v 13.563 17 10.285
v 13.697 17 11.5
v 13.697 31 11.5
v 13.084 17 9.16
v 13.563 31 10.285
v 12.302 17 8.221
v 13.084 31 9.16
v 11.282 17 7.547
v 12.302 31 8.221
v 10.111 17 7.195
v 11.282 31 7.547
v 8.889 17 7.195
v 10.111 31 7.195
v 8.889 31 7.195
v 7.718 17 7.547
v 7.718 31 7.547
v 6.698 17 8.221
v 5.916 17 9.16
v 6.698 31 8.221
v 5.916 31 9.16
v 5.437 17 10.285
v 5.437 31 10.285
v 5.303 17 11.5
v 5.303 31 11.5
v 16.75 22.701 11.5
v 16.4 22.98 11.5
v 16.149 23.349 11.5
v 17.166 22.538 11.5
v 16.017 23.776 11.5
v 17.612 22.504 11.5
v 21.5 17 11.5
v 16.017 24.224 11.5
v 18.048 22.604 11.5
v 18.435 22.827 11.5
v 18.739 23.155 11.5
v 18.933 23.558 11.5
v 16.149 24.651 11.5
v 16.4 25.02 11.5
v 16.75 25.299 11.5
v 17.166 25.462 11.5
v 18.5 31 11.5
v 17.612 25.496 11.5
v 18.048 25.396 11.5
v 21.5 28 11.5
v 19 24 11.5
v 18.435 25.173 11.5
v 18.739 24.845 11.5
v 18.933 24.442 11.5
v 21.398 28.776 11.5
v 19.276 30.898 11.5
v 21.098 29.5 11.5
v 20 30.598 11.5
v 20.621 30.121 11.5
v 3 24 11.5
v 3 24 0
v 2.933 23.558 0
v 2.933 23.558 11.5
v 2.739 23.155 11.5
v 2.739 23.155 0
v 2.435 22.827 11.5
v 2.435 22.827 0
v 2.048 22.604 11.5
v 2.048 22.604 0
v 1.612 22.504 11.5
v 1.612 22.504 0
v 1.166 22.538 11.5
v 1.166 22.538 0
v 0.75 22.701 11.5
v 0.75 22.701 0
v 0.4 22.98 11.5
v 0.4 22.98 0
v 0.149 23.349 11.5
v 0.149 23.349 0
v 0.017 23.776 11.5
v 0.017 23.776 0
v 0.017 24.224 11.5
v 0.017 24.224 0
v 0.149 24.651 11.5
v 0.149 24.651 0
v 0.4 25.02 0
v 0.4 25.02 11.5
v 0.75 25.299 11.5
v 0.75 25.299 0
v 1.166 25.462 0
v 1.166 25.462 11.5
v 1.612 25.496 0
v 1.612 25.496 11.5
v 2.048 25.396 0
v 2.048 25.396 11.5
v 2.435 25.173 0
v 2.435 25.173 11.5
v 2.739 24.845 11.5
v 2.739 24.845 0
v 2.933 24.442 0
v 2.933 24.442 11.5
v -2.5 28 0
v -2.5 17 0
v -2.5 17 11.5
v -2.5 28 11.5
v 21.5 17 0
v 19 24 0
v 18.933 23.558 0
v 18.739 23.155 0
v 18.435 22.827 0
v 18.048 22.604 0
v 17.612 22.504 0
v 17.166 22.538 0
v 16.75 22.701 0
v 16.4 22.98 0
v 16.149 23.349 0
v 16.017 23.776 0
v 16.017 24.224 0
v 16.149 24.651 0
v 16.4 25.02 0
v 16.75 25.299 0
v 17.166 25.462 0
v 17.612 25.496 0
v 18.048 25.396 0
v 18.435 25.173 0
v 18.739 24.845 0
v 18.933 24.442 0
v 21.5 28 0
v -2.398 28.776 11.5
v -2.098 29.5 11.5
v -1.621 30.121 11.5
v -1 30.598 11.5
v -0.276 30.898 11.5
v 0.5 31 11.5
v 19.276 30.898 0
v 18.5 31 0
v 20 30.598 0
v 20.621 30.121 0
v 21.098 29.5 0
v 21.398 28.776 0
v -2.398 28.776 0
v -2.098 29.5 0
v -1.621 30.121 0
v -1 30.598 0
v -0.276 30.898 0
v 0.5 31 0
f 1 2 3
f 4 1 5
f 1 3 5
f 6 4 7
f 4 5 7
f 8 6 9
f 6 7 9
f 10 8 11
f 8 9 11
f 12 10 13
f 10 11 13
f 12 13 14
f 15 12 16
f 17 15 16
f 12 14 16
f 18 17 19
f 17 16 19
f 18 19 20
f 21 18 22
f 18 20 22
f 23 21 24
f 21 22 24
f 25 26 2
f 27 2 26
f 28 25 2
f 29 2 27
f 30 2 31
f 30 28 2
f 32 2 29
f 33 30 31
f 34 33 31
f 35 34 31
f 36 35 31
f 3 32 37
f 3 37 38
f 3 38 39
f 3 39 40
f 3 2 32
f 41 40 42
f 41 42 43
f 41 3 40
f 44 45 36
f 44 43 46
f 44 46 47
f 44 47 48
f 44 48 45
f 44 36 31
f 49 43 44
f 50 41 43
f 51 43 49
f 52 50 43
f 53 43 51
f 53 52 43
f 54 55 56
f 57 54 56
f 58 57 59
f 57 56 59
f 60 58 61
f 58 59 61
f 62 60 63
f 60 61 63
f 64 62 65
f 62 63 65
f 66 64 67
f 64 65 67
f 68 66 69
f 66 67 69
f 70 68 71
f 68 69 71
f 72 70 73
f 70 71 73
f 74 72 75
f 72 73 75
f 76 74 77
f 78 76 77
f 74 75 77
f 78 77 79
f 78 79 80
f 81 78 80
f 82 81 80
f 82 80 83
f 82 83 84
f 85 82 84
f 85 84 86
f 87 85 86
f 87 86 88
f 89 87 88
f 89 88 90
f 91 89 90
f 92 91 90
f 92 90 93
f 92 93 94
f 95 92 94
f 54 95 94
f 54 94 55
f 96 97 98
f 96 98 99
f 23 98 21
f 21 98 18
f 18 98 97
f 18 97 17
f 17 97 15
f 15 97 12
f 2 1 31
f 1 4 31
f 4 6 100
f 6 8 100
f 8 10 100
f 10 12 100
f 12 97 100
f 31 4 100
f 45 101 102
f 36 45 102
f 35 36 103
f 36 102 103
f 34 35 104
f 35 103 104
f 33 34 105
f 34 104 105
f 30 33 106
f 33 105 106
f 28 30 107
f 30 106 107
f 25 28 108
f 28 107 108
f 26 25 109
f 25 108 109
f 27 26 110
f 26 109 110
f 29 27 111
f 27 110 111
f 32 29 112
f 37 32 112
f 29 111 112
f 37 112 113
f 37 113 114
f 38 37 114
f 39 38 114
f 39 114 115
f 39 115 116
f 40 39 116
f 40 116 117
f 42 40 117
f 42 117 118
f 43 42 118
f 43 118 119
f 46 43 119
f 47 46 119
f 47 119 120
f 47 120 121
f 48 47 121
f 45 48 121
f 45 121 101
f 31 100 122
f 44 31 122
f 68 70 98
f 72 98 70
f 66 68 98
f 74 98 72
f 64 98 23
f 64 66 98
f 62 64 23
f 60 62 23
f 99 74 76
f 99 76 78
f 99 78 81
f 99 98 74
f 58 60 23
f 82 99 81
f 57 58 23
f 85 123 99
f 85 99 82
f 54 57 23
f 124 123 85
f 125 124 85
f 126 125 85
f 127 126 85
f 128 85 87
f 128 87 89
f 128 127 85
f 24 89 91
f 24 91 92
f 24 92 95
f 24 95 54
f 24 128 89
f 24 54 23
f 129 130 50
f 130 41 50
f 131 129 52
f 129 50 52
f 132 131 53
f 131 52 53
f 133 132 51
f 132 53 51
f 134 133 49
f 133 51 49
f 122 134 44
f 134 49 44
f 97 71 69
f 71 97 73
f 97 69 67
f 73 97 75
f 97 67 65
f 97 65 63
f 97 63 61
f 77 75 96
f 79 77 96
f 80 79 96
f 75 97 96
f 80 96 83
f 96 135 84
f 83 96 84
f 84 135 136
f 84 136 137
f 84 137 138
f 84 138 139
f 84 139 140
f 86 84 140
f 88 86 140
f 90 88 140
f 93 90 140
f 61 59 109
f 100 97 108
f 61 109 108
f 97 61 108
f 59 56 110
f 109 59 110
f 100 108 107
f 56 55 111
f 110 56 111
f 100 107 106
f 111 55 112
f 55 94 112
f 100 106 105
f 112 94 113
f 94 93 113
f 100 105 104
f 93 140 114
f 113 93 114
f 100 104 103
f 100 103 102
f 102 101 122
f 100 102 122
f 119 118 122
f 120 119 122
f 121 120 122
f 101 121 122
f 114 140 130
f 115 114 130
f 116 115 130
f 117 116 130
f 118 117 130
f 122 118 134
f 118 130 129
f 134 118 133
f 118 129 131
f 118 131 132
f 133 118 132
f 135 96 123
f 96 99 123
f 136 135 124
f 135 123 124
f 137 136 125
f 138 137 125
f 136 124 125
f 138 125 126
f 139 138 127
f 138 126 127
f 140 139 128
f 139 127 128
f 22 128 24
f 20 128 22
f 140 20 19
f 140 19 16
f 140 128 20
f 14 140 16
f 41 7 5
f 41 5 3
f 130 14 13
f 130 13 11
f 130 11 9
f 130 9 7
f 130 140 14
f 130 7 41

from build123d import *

# Parameters (mm, degrees)
BOX001_W        = 24
BOX001_H        = 14
BOX001_DEPTH    = 11.5
SKETCH001_R     = 4.2
POCKET001_DEPTH = 14
SKETCH002_R     = 1.5
POCKET002_DEPTH = 11.501
FILLET003_R     = 3


with BuildPart() as part:
    # Box001 → Box001 (new body)
    with BuildSketch(Plane(origin=(-2.5, 17, 0), x_dir=(1, 0, 0), z_dir=(0, 0, 1))):
        with Locations((12, 7)):
            Rectangle(BOX001_W, BOX001_H)
    extrude(amount=BOX001_DEPTH)

    # Sketch001 → Pocket001 (cut)
    with BuildSketch(Plane(origin=(-2.5, 31, 0), x_dir=(-1, 0, 0), z_dir=(0, 1, 0))):
        with Locations((-12, 11.35)):
            Circle(SKETCH001_R)
    extrude(amount=-POCKET001_DEPTH, mode=Mode.SUBTRACT)

    # Sketch002 → Pocket002 (cut, through all)
    with BuildSketch(Plane(origin=(-2.5, 17, 0), x_dir=(1, 0, 0), z_dir=(0, 0, -1))):
        with Locations((4, -7)):
            Circle(SKETCH002_R)
        with Locations((20, -7)):
            Circle(SKETCH002_R)
    extrude(amount=-POCKET002_DEPTH, mode=Mode.SUBTRACT)

    # Fillet003
    fillet003_edges = [part.edges().sort_by_distance(p)[0] for p in [
        (-2.5, 31, 5.75),
        (21.5, 31, 5.75),
    ]]
    fillet(fillet003_edges, radius=FILLET003_R)


solid = part.part
